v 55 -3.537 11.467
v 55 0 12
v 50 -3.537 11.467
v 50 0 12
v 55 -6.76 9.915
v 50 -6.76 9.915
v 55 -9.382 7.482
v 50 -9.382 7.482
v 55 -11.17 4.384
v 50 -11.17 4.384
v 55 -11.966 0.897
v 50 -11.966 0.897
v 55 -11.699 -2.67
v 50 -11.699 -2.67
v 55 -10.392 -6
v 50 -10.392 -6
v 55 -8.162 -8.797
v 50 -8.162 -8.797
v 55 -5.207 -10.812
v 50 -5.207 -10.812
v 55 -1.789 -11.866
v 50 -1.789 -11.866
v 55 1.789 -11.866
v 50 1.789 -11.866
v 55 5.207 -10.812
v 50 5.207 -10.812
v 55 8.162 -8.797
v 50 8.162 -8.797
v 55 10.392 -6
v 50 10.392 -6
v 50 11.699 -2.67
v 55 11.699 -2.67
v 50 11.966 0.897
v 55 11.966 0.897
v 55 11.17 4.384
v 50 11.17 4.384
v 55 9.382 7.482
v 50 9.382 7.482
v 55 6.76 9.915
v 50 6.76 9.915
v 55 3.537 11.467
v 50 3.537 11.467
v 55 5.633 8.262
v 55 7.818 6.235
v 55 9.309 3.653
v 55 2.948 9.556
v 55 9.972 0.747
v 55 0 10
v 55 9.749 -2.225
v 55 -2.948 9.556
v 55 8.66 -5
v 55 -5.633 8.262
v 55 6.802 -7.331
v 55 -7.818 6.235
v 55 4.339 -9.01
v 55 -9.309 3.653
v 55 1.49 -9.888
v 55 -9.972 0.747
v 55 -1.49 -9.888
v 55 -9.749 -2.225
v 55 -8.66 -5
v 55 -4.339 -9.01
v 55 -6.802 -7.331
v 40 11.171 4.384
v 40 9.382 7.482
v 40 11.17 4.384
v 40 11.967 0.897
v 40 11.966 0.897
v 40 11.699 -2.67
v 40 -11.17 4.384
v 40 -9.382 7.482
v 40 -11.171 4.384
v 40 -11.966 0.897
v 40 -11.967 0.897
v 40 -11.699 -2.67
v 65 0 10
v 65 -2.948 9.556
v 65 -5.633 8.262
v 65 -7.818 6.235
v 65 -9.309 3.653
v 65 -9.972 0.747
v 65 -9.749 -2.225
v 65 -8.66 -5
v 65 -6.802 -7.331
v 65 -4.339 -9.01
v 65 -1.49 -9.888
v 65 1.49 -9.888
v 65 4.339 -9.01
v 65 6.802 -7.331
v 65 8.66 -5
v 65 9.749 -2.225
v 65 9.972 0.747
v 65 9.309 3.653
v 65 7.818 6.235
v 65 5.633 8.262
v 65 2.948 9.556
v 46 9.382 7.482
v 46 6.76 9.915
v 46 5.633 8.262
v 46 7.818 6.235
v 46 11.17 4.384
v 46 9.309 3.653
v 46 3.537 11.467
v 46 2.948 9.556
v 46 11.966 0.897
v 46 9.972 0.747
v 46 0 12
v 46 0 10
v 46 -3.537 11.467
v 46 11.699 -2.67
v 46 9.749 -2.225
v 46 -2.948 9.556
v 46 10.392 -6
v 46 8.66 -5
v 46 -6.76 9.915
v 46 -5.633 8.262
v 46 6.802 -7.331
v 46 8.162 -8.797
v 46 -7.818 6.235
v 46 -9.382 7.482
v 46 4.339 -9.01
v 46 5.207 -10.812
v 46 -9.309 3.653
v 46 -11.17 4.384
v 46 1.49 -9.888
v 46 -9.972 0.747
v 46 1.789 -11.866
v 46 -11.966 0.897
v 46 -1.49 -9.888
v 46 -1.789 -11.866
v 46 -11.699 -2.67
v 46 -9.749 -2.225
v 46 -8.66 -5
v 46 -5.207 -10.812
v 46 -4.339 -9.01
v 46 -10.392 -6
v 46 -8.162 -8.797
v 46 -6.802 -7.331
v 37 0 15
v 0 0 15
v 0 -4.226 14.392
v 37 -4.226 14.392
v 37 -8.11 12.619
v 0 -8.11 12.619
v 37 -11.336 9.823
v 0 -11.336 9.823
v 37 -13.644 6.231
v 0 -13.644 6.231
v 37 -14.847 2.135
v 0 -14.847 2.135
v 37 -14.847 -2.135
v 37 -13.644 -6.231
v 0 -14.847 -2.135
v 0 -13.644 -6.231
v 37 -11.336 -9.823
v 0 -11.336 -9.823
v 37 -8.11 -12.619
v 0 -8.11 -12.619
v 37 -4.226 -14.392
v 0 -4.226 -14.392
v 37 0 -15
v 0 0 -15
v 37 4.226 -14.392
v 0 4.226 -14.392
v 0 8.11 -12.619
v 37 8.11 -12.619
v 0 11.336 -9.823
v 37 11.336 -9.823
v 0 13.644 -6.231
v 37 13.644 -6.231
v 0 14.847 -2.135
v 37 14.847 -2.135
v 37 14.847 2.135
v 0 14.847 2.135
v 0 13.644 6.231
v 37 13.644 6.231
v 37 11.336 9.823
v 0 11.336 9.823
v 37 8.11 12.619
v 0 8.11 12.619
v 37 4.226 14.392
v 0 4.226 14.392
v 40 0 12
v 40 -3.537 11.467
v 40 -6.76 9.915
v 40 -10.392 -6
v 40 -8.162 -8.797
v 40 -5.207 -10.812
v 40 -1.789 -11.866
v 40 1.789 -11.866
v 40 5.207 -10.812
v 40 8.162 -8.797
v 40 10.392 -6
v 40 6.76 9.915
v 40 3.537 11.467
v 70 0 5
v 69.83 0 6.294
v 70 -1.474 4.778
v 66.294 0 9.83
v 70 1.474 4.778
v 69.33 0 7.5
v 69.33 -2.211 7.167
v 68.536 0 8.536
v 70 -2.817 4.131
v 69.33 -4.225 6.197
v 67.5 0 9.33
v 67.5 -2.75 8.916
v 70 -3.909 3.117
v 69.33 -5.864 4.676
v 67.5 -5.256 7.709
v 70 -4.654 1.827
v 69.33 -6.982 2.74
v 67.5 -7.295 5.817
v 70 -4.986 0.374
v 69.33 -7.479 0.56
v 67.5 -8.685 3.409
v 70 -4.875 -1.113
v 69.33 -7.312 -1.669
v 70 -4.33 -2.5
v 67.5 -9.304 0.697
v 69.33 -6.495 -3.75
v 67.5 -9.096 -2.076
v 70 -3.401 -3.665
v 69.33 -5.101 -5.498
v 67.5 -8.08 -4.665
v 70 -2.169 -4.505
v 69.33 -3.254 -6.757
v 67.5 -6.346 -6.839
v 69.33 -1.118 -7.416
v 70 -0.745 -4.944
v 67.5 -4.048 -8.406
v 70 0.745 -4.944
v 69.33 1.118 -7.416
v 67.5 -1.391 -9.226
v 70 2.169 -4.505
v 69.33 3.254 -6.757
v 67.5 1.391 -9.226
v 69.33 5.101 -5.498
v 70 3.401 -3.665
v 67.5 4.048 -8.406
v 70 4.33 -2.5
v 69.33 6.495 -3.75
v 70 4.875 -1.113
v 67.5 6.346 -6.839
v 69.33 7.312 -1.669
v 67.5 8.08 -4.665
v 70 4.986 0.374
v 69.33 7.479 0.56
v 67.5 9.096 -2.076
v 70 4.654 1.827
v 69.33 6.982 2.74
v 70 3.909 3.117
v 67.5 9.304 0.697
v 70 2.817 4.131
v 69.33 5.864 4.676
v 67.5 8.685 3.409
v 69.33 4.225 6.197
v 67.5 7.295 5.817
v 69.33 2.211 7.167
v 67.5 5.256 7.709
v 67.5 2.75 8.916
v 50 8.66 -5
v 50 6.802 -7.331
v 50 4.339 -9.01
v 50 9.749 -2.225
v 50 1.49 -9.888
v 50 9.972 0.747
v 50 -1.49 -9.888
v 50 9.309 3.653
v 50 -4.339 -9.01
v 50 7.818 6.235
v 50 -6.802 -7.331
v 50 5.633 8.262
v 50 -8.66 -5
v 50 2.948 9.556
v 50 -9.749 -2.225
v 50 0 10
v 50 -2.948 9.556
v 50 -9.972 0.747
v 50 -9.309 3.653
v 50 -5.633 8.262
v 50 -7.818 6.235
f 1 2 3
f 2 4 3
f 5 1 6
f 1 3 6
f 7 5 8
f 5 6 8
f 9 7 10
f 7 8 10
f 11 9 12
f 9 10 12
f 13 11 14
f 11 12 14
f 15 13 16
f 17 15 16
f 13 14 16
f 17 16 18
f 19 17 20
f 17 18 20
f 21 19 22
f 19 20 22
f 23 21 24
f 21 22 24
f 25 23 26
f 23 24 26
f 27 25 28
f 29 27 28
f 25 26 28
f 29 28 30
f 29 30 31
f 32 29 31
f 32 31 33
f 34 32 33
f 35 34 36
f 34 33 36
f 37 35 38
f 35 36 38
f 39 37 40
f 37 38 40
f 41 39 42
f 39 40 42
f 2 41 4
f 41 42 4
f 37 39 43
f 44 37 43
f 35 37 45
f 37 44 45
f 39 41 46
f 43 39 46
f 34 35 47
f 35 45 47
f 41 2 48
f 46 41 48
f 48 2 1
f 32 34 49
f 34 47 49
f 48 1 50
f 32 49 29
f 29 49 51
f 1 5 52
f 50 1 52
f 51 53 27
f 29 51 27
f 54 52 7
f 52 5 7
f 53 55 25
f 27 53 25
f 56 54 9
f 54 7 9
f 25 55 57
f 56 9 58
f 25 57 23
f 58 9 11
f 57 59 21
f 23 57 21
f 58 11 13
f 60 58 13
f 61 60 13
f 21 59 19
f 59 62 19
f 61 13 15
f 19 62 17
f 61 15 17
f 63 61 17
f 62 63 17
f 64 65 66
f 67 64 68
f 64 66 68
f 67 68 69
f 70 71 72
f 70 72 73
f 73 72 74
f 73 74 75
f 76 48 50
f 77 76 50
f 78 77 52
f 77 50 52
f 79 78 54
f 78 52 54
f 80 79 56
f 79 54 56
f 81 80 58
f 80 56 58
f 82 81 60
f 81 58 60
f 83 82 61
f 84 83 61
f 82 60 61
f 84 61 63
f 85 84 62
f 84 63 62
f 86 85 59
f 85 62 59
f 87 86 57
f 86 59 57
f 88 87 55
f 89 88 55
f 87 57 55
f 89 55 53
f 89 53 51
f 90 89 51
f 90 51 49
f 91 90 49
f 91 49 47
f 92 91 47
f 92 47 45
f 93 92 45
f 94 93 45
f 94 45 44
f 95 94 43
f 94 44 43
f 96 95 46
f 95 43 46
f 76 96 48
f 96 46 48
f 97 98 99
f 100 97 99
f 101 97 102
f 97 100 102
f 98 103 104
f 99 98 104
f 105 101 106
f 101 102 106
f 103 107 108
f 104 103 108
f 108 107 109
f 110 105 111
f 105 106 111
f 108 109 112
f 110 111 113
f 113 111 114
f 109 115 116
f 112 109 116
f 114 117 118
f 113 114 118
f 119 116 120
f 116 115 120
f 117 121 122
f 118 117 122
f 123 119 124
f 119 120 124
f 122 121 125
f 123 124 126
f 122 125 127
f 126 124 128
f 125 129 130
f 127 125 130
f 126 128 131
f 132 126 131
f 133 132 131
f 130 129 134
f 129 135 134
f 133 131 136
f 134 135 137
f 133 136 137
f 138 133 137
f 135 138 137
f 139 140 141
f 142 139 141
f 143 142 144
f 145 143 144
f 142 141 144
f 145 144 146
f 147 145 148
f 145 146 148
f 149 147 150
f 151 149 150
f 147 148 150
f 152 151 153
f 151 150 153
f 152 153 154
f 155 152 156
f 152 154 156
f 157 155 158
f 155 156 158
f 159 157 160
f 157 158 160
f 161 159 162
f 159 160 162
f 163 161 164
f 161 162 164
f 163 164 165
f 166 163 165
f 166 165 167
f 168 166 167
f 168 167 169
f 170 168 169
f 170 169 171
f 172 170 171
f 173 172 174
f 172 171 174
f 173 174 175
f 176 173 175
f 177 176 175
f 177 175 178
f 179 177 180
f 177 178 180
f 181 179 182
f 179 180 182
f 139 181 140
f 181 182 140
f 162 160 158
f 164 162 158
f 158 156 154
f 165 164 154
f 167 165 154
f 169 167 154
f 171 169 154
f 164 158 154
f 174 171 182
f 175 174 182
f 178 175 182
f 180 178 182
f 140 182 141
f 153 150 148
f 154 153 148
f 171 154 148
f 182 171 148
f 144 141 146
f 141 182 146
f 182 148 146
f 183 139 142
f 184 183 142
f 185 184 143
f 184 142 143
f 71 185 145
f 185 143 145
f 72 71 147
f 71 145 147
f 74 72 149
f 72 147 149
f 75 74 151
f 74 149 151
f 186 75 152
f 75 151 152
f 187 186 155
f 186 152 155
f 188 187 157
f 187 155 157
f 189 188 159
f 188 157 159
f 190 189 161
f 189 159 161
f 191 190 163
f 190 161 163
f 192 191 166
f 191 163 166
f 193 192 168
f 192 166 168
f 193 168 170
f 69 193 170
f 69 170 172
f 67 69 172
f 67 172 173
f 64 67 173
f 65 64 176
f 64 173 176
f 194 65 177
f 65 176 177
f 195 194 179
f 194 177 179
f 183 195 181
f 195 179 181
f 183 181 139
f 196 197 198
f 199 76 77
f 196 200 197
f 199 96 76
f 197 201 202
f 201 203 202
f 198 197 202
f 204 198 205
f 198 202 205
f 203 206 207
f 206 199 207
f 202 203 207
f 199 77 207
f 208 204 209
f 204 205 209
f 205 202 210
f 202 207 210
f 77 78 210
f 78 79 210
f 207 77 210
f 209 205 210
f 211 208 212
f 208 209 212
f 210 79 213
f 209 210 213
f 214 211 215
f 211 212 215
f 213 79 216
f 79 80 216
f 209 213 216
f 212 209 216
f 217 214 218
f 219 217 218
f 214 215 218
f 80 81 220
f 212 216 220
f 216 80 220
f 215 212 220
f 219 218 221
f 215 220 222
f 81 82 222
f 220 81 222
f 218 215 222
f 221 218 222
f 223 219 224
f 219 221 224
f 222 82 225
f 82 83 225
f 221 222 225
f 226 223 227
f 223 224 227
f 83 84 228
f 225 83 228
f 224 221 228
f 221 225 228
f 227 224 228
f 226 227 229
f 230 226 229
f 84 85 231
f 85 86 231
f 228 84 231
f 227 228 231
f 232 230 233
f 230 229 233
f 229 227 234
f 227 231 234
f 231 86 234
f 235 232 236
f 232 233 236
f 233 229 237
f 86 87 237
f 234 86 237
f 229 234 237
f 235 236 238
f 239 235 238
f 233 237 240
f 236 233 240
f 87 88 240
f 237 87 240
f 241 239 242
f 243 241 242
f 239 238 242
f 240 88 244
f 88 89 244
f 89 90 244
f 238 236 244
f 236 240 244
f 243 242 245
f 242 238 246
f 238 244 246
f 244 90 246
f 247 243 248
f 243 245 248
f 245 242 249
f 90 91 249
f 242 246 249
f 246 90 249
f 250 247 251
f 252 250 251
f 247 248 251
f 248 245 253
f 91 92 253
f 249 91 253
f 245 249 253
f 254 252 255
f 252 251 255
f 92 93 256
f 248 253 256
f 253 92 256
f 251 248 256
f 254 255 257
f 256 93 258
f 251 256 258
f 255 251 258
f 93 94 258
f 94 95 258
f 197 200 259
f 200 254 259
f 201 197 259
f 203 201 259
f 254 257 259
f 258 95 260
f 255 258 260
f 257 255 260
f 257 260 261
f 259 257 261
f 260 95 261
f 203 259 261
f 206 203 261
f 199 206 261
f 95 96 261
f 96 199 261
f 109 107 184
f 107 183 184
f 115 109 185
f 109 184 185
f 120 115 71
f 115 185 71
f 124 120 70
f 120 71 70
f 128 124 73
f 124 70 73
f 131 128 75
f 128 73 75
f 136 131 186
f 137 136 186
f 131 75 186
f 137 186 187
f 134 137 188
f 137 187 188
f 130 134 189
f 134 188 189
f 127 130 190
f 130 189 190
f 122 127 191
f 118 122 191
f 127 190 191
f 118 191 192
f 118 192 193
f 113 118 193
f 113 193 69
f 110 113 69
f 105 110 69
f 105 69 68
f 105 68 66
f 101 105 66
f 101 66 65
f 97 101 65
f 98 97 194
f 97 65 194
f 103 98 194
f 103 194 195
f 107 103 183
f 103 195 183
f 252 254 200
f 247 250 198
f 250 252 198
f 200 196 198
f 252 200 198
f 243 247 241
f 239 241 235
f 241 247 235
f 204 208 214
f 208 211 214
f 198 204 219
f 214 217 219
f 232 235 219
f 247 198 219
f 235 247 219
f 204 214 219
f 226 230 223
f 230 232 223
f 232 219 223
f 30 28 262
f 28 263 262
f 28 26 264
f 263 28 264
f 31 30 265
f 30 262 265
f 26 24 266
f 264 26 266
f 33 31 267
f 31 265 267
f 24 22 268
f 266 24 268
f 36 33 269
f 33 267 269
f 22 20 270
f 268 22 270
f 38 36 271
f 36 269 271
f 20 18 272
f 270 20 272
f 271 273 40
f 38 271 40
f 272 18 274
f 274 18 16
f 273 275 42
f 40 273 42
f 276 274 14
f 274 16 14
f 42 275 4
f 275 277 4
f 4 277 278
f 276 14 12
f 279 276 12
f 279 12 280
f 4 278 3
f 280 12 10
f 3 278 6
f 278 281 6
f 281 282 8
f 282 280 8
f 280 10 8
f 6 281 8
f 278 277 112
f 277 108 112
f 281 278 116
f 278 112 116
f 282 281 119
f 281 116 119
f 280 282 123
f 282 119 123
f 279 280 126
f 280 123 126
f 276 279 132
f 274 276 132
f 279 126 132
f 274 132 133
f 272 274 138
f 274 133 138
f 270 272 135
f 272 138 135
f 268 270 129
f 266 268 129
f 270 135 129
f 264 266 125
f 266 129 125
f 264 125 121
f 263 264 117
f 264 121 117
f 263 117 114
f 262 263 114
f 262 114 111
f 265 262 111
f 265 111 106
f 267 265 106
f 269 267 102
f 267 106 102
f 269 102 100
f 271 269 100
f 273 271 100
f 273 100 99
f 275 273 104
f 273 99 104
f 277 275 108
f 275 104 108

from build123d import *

# Parameters (mm, degrees)
ZAOBLIT1_R    = 5
ZKOSEN_1_SIZE = 3


with BuildPart() as part:
    # Skica1 → Rotovat1 (revolve)
    with BuildSketch(Plane.XY, mode=Mode.PRIVATE) as rotovat1_sk:
        Polygon((0, 15), (0, 0), (70, 0), (70, 10), (55, 10), (55, 12), (50, 12), (50, 10), (46, 10), (46, 12), (40, 12), (40, 15), align=None)
    revolve(rotovat1_sk.sketch.rotate(Axis((-5.449862177, 0, 0), (1, 0, 0)), 90), axis=Axis((-5.449862177, 0, 0), (1, 0, 0)))

    # Zaoblit1
    zaoblit1_edges = [part.edges().sort_by_distance(p)[0] for p in [
        (70, 0, -10),
    ]]
    fillet(zaoblit1_edges, radius=ZAOBLIT1_R)

    # Zkosení1
    zkosen_1_edges = [part.edges().sort_by_distance(p)[0] for p in [
        (40, 0, -15),
    ]]
    chamfer(zkosen_1_edges, length=ZKOSEN_1_SIZE - 0.0001)  # a hair under: the kernel refuses the full size


solid = part.part
